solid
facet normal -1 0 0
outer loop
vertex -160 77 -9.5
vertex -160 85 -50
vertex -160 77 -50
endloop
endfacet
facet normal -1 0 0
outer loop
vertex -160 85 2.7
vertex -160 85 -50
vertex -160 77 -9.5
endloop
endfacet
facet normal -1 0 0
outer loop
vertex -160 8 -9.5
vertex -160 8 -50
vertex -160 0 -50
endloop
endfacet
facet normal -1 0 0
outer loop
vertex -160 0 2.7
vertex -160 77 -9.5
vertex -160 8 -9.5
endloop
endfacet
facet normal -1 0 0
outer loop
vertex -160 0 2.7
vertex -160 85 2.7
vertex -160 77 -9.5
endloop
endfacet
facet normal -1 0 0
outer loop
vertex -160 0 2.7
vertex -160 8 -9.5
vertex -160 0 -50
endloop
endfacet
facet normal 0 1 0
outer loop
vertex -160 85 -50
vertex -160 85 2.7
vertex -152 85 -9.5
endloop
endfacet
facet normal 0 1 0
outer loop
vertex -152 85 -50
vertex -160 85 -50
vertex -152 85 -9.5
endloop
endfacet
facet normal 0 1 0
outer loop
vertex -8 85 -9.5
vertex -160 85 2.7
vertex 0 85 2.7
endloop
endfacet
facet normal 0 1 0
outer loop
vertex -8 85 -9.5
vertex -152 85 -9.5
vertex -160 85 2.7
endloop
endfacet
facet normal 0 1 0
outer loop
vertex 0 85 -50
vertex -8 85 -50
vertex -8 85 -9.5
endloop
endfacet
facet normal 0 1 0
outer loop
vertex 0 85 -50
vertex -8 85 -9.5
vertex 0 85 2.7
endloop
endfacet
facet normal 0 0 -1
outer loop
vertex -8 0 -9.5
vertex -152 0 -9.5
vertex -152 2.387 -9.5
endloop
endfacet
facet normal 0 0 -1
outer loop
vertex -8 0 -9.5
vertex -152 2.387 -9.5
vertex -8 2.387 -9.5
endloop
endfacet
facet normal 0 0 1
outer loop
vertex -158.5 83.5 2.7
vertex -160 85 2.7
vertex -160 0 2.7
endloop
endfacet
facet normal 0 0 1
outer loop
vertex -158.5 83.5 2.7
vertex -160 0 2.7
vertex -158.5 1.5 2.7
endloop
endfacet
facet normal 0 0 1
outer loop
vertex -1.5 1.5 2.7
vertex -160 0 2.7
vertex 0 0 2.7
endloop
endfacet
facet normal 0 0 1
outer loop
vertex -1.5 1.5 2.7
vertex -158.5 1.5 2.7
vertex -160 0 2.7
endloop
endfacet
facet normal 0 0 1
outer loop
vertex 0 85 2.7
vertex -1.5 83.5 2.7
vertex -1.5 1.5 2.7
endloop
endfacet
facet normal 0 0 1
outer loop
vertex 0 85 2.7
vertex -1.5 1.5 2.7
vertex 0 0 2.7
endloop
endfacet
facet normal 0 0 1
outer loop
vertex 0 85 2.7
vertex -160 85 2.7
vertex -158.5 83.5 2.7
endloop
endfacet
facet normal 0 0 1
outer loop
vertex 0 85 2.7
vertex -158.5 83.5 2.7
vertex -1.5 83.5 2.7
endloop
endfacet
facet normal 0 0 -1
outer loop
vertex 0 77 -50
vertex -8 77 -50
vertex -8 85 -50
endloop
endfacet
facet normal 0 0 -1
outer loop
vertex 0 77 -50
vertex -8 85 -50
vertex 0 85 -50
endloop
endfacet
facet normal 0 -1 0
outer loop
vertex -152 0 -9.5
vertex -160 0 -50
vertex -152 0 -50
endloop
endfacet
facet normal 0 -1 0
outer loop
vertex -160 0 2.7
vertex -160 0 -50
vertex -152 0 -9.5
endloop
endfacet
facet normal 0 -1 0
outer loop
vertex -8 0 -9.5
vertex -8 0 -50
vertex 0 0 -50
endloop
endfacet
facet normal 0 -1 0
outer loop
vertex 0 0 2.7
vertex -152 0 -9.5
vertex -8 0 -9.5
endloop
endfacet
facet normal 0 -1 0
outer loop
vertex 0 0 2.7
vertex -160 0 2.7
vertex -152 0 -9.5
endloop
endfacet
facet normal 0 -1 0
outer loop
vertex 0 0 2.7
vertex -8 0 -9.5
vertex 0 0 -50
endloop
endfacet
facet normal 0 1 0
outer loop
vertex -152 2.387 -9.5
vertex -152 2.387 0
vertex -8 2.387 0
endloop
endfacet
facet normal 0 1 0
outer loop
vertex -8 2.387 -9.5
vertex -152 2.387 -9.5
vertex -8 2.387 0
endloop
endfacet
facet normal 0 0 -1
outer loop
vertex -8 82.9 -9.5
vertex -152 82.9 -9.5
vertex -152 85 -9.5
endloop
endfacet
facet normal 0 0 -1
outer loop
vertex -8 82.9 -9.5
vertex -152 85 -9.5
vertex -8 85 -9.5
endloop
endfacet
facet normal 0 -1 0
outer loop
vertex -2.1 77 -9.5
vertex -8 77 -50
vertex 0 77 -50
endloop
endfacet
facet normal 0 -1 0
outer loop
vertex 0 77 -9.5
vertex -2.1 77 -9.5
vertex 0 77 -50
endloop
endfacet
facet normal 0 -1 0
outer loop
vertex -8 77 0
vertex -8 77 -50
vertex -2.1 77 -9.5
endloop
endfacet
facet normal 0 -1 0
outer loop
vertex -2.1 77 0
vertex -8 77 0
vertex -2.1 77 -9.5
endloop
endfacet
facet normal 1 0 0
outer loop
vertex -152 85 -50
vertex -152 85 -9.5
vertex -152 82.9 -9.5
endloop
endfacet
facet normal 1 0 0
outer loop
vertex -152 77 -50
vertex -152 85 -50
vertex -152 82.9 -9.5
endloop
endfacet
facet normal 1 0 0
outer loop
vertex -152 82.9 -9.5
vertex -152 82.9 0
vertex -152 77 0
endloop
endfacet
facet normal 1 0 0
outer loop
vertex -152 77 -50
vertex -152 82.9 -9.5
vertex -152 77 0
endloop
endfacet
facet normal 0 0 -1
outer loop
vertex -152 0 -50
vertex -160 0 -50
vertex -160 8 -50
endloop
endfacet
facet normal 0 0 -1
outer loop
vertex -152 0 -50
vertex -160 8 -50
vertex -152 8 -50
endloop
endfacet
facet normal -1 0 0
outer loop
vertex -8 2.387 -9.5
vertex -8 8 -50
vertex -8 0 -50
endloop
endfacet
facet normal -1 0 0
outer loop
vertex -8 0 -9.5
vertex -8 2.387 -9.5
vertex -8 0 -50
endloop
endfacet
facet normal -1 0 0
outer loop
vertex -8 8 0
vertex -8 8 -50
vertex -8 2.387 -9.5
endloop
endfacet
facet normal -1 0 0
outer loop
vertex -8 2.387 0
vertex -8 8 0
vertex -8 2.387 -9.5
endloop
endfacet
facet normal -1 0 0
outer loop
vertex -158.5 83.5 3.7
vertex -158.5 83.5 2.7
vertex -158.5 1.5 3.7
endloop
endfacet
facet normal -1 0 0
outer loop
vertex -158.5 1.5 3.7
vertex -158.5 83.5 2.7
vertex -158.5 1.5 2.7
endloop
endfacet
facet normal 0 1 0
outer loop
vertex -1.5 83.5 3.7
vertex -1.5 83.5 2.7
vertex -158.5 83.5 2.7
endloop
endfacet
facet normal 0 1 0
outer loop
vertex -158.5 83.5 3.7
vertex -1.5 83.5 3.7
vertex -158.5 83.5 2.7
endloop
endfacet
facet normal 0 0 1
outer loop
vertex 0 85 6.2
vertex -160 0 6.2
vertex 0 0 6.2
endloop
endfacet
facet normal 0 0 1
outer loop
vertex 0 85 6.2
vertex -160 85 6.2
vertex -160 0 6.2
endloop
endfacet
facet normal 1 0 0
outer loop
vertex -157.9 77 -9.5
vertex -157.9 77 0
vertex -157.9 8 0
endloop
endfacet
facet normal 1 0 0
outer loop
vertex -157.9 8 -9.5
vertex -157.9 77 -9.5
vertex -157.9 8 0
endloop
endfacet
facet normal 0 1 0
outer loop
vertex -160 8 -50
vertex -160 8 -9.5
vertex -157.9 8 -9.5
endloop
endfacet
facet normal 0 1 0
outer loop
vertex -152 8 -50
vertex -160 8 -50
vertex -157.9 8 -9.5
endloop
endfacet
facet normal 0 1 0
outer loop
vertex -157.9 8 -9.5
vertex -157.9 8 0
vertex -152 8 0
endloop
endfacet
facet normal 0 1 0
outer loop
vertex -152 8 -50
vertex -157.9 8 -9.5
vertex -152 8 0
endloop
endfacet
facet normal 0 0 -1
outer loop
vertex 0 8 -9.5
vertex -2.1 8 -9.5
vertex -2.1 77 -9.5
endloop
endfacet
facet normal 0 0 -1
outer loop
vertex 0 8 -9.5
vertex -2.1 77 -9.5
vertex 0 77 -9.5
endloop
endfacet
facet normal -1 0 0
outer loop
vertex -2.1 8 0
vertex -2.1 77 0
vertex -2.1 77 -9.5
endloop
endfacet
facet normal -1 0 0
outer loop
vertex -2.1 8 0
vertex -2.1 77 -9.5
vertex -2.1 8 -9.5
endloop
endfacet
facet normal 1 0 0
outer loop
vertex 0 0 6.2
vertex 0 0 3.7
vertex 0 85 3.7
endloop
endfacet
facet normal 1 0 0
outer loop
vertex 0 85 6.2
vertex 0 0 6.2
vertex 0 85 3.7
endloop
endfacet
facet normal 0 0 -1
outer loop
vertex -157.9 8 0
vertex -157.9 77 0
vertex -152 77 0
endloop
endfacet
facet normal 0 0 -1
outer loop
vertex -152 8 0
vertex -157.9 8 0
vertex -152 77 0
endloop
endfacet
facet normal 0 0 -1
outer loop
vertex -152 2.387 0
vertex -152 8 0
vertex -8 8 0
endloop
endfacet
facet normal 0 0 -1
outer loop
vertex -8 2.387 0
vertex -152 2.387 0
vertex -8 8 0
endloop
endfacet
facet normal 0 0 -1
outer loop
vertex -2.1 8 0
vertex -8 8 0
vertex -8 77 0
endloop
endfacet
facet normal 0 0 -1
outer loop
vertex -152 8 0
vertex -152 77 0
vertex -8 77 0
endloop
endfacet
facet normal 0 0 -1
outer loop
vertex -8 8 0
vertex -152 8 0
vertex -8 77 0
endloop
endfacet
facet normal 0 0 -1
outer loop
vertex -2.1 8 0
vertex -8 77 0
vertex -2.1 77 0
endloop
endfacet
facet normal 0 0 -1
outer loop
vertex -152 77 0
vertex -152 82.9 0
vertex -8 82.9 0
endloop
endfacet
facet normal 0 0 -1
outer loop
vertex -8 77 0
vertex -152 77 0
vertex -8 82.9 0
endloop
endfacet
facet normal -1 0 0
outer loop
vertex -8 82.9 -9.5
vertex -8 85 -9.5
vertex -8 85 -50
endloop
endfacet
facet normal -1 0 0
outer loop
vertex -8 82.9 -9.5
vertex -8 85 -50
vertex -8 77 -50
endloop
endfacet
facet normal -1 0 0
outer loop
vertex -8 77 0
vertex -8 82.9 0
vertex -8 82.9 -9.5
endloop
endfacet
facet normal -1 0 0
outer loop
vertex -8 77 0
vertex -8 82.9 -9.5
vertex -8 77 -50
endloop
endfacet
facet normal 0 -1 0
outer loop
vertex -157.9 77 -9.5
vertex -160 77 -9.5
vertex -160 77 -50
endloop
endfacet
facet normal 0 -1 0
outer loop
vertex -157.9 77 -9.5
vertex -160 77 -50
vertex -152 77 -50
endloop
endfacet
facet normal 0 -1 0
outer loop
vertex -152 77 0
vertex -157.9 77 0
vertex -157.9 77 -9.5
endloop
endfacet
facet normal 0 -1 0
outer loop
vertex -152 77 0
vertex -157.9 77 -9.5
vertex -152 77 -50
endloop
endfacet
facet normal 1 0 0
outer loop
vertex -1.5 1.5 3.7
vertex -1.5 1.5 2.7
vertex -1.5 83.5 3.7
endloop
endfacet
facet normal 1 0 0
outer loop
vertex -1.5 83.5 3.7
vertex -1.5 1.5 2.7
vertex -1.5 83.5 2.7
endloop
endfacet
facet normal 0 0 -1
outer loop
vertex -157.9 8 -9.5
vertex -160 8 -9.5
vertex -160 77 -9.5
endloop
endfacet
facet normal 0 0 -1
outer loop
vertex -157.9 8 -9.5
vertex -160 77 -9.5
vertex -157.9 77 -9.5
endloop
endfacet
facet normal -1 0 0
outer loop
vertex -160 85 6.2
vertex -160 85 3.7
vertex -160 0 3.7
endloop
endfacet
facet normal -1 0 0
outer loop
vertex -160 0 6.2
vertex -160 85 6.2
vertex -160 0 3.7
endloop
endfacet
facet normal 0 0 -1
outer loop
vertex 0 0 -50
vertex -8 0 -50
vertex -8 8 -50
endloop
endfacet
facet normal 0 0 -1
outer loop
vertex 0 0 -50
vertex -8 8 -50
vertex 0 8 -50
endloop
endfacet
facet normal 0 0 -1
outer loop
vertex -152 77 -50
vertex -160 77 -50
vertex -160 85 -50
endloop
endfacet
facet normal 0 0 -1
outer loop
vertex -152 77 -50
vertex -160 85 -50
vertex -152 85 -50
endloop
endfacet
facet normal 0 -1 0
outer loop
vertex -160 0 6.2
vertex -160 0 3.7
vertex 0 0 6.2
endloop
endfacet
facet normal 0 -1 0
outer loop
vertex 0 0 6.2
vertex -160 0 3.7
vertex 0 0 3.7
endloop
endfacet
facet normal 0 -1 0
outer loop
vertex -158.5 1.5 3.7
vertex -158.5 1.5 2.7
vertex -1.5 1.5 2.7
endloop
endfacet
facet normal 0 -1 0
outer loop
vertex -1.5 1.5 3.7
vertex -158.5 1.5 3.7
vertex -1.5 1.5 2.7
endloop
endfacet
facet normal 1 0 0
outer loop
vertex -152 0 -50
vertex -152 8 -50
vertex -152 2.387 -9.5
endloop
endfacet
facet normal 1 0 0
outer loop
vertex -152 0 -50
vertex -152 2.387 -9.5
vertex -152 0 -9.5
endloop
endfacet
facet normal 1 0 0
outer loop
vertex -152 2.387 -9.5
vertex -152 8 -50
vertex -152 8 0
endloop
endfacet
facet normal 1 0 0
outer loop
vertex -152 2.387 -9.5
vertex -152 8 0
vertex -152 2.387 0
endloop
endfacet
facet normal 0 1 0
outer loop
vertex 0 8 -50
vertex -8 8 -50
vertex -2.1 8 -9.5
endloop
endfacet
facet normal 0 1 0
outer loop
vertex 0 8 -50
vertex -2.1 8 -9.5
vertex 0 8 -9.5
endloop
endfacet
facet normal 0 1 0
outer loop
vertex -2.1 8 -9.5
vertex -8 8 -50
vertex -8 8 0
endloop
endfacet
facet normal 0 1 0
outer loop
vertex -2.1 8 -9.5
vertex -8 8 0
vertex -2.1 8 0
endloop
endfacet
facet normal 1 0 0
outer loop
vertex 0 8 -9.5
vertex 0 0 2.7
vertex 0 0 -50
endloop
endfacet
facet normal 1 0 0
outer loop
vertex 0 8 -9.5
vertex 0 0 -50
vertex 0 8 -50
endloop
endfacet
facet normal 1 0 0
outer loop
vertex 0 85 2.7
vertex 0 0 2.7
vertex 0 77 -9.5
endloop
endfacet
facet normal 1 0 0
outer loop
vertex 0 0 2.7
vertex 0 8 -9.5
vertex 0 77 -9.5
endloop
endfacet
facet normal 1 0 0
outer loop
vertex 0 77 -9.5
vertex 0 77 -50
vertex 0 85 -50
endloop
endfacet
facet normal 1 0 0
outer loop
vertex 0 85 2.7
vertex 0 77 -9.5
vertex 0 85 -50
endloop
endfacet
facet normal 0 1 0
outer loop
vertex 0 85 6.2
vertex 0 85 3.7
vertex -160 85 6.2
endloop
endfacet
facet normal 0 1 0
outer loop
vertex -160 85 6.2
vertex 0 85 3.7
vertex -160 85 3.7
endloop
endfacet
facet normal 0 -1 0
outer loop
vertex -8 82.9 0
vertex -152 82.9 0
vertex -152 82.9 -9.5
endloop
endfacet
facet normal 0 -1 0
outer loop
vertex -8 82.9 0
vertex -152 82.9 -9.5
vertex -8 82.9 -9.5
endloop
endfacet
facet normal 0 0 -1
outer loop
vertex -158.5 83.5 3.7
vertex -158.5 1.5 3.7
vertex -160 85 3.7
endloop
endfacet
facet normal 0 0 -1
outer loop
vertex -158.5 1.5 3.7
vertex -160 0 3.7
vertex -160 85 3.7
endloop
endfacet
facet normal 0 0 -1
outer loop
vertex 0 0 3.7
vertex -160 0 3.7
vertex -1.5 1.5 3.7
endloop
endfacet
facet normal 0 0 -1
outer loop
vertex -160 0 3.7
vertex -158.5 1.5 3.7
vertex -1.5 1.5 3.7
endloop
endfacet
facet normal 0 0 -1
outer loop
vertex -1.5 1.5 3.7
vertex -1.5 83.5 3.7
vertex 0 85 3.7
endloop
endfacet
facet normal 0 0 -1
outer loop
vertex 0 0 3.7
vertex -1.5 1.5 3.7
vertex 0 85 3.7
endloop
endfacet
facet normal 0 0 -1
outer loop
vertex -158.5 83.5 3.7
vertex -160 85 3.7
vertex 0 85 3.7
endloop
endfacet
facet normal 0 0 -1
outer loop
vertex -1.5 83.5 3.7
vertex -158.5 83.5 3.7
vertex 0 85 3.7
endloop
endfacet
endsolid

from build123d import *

# Parameters (mm, degrees)
F0_W      = 160
F0_H      = 85
F1_DEPTH  = 2.7
F3_DEPTH  = 1
F4_W      = 8
F4_H      = 8
F5_DEPTH  = 50
F6_DEPTH  = 50
F8_DEPTH  = 2.5
F9_W      = 144
F9_H      = 2.387096
F9_W_2    = 2.1
F9_H_2    = 69
F9_H_3    = 2.1
F10_DEPTH = 9.5


with BuildPart() as f1:
    # F0 (on Top) → F1 (new body)
    with BuildSketch(Plane.XY):
        with Locations((-80, 42.5)):
            Rectangle(F0_W, F0_H)
    extrude(amount=F1_DEPTH)

    # F2 (on face) → F3 (join)
    with BuildSketch(Plane.XY.offset(2.7)):
        Polygon((-1.5, 42.5), (-1.5, 83.5), (-80, 83.5), (-158.5, 83.5), (-158.5, 42.5), (-158.5, 1.5), (-80, 1.5), (-1.5, 1.5), align=None)
    extrude(amount=F3_DEPTH)

    # F4 (on face) → F5 (join)
    with BuildSketch(Plane(origin=(0, 0, 0), x_dir=(1, 0, 0), z_dir=(0, 0, -1))):
        with Locations((-156, -4)):
            Rectangle(F4_W, F4_H)
    extrude(amount=F5_DEPTH)

    # F4 (on face) → F6 (join)
    with BuildSketch(Plane(origin=(0, 0, 0), x_dir=(1, 0, 0), z_dir=(0, 0, -1))):
        with Locations((-156, -4)):
            Rectangle(F4_W, F4_H)
        with Locations((-156, -81)):
            Rectangle(F4_W, F4_H)
        with Locations((-4, -81)):
            Rectangle(F4_W, F4_H)
        with Locations((-4, -4)):
            Rectangle(F4_W, F4_H)
    extrude(amount=F6_DEPTH)

    # F7 (on face) → F8 (join)
    with BuildSketch(Plane.XY.offset(3.7)):
        Polygon((-160, 42.5), (-160, 0), (-80, 0), (0, 0), (0, 42.5), (0, 85), (-80, 85), (-160, 85), align=None)
    extrude(amount=F8_DEPTH)

    # F9 (on face) → F10 (join)
    with BuildSketch(Plane(origin=(0, 0, 0), x_dir=(1, 0, 0), z_dir=(0, 0, -1))):
        with Locations((-80, -1.193548)):
            Rectangle(F9_W, F9_H)
        with Locations((-158.95, -42.5)):
            Rectangle(F9_W_2, F9_H_2)
        with Locations((-1.05, -42.5)):
            Rectangle(F9_W_2, F9_H_2)
        with Locations((-80, -83.95)):
            Rectangle(F9_W, F9_H_3)
    extrude(amount=F10_DEPTH)


solid = f1.part
